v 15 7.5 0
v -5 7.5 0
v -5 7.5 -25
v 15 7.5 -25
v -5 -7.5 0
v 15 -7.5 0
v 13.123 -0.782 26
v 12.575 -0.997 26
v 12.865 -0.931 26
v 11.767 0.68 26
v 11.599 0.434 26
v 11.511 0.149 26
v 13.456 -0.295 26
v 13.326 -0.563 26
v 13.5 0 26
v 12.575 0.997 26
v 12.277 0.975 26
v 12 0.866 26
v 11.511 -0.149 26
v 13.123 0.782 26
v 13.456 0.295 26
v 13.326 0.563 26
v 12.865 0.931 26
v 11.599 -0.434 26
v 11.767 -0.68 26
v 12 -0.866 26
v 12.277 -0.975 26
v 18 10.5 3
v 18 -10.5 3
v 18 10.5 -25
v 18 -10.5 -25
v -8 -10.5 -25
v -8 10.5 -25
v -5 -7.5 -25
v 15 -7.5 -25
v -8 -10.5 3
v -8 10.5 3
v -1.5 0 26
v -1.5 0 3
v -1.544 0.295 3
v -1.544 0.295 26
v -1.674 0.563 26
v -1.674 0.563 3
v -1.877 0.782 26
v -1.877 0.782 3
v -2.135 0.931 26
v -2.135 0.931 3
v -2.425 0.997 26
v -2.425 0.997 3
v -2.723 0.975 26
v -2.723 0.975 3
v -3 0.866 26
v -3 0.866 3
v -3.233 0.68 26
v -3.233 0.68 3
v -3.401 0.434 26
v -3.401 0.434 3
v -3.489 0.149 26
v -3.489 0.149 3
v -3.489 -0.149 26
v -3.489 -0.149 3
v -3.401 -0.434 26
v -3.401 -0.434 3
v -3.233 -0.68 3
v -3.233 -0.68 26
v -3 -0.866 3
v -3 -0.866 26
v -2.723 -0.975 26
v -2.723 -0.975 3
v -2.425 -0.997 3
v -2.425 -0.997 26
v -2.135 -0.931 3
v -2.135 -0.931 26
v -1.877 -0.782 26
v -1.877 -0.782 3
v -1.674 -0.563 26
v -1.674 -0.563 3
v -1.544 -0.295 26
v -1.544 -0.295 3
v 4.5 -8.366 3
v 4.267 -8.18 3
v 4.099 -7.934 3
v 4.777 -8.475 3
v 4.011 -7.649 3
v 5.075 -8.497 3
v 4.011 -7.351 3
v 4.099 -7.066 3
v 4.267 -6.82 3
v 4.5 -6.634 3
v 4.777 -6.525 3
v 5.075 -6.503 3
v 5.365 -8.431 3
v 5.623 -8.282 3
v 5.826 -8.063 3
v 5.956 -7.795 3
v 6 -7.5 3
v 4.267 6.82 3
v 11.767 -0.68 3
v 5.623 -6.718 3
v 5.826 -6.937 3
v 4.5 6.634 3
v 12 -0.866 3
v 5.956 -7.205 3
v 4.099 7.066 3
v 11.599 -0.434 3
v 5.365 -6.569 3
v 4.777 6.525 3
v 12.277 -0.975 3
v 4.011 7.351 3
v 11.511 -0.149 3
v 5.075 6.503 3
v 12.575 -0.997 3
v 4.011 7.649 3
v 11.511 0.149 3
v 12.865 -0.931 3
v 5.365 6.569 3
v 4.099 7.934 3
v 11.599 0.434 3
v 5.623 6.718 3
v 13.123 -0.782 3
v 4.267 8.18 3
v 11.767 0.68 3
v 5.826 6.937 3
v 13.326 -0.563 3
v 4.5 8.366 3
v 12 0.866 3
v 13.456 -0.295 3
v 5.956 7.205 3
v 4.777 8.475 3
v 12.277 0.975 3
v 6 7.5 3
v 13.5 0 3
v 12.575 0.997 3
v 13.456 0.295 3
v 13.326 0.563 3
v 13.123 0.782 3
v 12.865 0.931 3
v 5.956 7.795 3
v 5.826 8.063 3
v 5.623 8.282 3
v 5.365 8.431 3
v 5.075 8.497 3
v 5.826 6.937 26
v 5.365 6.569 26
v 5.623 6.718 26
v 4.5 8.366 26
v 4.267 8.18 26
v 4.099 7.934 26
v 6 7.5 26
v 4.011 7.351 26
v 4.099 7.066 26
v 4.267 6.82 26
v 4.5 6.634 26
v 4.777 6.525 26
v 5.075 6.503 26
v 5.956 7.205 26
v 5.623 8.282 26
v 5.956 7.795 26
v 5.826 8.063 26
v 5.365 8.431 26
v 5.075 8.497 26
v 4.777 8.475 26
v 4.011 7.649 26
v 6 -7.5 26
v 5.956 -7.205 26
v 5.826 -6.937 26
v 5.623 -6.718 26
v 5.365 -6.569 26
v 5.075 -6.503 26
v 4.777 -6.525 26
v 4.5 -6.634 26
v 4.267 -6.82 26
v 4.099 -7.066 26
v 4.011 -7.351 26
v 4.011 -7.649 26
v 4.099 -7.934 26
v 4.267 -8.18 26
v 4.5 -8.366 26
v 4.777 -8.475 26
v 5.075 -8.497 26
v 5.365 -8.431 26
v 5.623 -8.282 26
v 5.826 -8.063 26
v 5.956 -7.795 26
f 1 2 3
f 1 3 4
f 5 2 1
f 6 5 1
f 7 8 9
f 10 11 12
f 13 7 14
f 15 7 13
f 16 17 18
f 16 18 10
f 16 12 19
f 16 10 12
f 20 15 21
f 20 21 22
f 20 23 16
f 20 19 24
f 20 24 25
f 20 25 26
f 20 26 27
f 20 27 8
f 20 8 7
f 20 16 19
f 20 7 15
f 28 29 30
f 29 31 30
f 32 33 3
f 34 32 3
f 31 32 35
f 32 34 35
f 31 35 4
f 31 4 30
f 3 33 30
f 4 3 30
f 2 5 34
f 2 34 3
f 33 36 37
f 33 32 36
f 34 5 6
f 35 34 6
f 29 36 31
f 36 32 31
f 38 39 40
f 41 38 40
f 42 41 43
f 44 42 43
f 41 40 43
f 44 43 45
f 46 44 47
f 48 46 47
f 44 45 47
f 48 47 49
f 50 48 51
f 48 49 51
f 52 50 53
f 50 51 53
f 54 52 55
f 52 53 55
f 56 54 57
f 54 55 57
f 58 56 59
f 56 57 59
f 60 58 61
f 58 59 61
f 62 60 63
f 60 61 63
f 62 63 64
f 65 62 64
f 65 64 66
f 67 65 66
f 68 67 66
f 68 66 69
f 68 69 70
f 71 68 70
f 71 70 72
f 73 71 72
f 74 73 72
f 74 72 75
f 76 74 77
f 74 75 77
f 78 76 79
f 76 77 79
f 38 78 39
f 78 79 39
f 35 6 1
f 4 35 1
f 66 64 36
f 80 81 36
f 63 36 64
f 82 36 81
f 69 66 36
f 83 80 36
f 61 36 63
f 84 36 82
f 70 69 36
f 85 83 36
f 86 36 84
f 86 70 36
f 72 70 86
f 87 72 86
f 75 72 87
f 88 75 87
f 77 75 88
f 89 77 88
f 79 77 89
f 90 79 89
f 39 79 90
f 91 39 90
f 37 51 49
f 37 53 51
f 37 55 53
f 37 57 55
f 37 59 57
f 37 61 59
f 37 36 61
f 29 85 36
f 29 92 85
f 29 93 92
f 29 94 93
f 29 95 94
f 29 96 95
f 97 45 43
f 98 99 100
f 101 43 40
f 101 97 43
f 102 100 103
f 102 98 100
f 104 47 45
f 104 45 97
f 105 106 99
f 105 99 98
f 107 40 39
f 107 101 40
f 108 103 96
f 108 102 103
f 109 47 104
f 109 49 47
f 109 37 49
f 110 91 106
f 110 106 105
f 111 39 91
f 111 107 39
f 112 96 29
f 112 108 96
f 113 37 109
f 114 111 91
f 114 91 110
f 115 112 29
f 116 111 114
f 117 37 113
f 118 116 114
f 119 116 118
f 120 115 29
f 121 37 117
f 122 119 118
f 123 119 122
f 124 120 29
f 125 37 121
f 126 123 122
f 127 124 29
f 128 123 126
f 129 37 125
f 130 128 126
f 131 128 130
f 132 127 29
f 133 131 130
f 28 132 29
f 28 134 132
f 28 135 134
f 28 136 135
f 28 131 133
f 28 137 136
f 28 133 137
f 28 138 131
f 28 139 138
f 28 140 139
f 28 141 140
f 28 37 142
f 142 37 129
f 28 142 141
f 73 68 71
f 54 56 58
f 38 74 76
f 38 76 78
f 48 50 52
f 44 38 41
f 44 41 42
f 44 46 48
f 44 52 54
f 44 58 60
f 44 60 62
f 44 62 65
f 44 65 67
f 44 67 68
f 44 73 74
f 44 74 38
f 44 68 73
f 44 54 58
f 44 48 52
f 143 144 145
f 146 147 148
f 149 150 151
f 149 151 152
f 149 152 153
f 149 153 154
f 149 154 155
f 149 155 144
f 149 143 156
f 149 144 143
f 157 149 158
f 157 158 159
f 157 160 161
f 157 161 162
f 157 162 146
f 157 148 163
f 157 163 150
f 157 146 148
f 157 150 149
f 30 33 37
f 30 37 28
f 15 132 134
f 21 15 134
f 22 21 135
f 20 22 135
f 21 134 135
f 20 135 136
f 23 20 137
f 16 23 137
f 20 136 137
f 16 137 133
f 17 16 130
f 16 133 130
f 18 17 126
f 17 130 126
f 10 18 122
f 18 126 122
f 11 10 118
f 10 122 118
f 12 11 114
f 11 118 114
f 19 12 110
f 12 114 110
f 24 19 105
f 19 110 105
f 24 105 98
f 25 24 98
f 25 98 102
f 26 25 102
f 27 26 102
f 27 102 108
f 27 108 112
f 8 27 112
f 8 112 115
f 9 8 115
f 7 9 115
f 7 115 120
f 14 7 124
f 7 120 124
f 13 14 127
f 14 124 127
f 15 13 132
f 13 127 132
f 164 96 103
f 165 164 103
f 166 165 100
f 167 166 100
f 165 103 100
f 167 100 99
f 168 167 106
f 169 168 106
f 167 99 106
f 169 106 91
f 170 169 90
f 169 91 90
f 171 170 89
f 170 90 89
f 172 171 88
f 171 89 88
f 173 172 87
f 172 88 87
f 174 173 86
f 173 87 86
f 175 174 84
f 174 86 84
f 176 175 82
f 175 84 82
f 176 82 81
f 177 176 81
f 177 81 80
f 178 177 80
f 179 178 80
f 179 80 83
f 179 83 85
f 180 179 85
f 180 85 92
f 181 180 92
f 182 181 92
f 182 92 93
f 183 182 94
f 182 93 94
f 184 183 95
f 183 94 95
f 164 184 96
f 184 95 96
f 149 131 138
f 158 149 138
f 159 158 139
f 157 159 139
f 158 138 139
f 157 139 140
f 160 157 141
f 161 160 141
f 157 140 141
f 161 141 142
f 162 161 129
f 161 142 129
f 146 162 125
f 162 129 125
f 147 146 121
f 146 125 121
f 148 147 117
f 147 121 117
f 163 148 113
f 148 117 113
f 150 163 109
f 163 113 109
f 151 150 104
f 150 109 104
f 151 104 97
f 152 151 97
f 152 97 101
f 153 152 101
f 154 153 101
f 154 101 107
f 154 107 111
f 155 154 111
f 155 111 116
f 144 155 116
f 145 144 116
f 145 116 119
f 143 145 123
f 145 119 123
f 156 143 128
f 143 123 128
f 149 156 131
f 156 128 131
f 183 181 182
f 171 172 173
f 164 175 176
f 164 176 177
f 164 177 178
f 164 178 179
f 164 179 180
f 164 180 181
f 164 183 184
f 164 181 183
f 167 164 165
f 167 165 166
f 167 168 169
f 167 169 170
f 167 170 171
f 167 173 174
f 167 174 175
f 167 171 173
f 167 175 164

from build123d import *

# Parameters (mm, degrees)
SKETCH1_W           = 26
SKETCH1_H           = 21
SKETCH1_W_2         = 20
SKETCH1_H_2         = 15
BOSS_EXTRUDE1_DEPTH = 25
SKETCH2_W           = 26
SKETCH2_H           = 21
BOSS_EXTRUDE2_DEPTH = 3
SKETCH3_R           = 1
BOSS_EXTRUDE3_DEPTH = 23


with BuildPart() as part:
    # Sketch1 → Boss-Extrude1 (new body)
    with BuildSketch(Plane.XY):
        with Locations((5, 0)):
            Rectangle(SKETCH1_W, SKETCH1_H)
        with Locations((5, 0)):
            Rectangle(SKETCH1_W_2, SKETCH1_H_2, mode=Mode.SUBTRACT)
    extrude(amount=-BOSS_EXTRUDE1_DEPTH)

    # Sketch2 → Boss-Extrude2 (add)
    with BuildSketch(Plane.XY):
        with Locations((5, 0)):
            Rectangle(SKETCH2_W, SKETCH2_H)
    extrude(amount=BOSS_EXTRUDE2_DEPTH)

    # Sketch3 → Boss-Extrude3 (add)
    with BuildSketch(Plane.XY.offset(3)):
        with Locations((12.5, 0)):
            Circle(SKETCH3_R)
        with Locations((5, -7.5)):
            Circle(SKETCH3_R)
        with Locations((-2.5, 0)):
            Circle(SKETCH3_R)
        with Locations((5, 7.5)):
            Circle(SKETCH3_R)
    extrude(amount=BOSS_EXTRUDE3_DEPTH)


solid = part.part
